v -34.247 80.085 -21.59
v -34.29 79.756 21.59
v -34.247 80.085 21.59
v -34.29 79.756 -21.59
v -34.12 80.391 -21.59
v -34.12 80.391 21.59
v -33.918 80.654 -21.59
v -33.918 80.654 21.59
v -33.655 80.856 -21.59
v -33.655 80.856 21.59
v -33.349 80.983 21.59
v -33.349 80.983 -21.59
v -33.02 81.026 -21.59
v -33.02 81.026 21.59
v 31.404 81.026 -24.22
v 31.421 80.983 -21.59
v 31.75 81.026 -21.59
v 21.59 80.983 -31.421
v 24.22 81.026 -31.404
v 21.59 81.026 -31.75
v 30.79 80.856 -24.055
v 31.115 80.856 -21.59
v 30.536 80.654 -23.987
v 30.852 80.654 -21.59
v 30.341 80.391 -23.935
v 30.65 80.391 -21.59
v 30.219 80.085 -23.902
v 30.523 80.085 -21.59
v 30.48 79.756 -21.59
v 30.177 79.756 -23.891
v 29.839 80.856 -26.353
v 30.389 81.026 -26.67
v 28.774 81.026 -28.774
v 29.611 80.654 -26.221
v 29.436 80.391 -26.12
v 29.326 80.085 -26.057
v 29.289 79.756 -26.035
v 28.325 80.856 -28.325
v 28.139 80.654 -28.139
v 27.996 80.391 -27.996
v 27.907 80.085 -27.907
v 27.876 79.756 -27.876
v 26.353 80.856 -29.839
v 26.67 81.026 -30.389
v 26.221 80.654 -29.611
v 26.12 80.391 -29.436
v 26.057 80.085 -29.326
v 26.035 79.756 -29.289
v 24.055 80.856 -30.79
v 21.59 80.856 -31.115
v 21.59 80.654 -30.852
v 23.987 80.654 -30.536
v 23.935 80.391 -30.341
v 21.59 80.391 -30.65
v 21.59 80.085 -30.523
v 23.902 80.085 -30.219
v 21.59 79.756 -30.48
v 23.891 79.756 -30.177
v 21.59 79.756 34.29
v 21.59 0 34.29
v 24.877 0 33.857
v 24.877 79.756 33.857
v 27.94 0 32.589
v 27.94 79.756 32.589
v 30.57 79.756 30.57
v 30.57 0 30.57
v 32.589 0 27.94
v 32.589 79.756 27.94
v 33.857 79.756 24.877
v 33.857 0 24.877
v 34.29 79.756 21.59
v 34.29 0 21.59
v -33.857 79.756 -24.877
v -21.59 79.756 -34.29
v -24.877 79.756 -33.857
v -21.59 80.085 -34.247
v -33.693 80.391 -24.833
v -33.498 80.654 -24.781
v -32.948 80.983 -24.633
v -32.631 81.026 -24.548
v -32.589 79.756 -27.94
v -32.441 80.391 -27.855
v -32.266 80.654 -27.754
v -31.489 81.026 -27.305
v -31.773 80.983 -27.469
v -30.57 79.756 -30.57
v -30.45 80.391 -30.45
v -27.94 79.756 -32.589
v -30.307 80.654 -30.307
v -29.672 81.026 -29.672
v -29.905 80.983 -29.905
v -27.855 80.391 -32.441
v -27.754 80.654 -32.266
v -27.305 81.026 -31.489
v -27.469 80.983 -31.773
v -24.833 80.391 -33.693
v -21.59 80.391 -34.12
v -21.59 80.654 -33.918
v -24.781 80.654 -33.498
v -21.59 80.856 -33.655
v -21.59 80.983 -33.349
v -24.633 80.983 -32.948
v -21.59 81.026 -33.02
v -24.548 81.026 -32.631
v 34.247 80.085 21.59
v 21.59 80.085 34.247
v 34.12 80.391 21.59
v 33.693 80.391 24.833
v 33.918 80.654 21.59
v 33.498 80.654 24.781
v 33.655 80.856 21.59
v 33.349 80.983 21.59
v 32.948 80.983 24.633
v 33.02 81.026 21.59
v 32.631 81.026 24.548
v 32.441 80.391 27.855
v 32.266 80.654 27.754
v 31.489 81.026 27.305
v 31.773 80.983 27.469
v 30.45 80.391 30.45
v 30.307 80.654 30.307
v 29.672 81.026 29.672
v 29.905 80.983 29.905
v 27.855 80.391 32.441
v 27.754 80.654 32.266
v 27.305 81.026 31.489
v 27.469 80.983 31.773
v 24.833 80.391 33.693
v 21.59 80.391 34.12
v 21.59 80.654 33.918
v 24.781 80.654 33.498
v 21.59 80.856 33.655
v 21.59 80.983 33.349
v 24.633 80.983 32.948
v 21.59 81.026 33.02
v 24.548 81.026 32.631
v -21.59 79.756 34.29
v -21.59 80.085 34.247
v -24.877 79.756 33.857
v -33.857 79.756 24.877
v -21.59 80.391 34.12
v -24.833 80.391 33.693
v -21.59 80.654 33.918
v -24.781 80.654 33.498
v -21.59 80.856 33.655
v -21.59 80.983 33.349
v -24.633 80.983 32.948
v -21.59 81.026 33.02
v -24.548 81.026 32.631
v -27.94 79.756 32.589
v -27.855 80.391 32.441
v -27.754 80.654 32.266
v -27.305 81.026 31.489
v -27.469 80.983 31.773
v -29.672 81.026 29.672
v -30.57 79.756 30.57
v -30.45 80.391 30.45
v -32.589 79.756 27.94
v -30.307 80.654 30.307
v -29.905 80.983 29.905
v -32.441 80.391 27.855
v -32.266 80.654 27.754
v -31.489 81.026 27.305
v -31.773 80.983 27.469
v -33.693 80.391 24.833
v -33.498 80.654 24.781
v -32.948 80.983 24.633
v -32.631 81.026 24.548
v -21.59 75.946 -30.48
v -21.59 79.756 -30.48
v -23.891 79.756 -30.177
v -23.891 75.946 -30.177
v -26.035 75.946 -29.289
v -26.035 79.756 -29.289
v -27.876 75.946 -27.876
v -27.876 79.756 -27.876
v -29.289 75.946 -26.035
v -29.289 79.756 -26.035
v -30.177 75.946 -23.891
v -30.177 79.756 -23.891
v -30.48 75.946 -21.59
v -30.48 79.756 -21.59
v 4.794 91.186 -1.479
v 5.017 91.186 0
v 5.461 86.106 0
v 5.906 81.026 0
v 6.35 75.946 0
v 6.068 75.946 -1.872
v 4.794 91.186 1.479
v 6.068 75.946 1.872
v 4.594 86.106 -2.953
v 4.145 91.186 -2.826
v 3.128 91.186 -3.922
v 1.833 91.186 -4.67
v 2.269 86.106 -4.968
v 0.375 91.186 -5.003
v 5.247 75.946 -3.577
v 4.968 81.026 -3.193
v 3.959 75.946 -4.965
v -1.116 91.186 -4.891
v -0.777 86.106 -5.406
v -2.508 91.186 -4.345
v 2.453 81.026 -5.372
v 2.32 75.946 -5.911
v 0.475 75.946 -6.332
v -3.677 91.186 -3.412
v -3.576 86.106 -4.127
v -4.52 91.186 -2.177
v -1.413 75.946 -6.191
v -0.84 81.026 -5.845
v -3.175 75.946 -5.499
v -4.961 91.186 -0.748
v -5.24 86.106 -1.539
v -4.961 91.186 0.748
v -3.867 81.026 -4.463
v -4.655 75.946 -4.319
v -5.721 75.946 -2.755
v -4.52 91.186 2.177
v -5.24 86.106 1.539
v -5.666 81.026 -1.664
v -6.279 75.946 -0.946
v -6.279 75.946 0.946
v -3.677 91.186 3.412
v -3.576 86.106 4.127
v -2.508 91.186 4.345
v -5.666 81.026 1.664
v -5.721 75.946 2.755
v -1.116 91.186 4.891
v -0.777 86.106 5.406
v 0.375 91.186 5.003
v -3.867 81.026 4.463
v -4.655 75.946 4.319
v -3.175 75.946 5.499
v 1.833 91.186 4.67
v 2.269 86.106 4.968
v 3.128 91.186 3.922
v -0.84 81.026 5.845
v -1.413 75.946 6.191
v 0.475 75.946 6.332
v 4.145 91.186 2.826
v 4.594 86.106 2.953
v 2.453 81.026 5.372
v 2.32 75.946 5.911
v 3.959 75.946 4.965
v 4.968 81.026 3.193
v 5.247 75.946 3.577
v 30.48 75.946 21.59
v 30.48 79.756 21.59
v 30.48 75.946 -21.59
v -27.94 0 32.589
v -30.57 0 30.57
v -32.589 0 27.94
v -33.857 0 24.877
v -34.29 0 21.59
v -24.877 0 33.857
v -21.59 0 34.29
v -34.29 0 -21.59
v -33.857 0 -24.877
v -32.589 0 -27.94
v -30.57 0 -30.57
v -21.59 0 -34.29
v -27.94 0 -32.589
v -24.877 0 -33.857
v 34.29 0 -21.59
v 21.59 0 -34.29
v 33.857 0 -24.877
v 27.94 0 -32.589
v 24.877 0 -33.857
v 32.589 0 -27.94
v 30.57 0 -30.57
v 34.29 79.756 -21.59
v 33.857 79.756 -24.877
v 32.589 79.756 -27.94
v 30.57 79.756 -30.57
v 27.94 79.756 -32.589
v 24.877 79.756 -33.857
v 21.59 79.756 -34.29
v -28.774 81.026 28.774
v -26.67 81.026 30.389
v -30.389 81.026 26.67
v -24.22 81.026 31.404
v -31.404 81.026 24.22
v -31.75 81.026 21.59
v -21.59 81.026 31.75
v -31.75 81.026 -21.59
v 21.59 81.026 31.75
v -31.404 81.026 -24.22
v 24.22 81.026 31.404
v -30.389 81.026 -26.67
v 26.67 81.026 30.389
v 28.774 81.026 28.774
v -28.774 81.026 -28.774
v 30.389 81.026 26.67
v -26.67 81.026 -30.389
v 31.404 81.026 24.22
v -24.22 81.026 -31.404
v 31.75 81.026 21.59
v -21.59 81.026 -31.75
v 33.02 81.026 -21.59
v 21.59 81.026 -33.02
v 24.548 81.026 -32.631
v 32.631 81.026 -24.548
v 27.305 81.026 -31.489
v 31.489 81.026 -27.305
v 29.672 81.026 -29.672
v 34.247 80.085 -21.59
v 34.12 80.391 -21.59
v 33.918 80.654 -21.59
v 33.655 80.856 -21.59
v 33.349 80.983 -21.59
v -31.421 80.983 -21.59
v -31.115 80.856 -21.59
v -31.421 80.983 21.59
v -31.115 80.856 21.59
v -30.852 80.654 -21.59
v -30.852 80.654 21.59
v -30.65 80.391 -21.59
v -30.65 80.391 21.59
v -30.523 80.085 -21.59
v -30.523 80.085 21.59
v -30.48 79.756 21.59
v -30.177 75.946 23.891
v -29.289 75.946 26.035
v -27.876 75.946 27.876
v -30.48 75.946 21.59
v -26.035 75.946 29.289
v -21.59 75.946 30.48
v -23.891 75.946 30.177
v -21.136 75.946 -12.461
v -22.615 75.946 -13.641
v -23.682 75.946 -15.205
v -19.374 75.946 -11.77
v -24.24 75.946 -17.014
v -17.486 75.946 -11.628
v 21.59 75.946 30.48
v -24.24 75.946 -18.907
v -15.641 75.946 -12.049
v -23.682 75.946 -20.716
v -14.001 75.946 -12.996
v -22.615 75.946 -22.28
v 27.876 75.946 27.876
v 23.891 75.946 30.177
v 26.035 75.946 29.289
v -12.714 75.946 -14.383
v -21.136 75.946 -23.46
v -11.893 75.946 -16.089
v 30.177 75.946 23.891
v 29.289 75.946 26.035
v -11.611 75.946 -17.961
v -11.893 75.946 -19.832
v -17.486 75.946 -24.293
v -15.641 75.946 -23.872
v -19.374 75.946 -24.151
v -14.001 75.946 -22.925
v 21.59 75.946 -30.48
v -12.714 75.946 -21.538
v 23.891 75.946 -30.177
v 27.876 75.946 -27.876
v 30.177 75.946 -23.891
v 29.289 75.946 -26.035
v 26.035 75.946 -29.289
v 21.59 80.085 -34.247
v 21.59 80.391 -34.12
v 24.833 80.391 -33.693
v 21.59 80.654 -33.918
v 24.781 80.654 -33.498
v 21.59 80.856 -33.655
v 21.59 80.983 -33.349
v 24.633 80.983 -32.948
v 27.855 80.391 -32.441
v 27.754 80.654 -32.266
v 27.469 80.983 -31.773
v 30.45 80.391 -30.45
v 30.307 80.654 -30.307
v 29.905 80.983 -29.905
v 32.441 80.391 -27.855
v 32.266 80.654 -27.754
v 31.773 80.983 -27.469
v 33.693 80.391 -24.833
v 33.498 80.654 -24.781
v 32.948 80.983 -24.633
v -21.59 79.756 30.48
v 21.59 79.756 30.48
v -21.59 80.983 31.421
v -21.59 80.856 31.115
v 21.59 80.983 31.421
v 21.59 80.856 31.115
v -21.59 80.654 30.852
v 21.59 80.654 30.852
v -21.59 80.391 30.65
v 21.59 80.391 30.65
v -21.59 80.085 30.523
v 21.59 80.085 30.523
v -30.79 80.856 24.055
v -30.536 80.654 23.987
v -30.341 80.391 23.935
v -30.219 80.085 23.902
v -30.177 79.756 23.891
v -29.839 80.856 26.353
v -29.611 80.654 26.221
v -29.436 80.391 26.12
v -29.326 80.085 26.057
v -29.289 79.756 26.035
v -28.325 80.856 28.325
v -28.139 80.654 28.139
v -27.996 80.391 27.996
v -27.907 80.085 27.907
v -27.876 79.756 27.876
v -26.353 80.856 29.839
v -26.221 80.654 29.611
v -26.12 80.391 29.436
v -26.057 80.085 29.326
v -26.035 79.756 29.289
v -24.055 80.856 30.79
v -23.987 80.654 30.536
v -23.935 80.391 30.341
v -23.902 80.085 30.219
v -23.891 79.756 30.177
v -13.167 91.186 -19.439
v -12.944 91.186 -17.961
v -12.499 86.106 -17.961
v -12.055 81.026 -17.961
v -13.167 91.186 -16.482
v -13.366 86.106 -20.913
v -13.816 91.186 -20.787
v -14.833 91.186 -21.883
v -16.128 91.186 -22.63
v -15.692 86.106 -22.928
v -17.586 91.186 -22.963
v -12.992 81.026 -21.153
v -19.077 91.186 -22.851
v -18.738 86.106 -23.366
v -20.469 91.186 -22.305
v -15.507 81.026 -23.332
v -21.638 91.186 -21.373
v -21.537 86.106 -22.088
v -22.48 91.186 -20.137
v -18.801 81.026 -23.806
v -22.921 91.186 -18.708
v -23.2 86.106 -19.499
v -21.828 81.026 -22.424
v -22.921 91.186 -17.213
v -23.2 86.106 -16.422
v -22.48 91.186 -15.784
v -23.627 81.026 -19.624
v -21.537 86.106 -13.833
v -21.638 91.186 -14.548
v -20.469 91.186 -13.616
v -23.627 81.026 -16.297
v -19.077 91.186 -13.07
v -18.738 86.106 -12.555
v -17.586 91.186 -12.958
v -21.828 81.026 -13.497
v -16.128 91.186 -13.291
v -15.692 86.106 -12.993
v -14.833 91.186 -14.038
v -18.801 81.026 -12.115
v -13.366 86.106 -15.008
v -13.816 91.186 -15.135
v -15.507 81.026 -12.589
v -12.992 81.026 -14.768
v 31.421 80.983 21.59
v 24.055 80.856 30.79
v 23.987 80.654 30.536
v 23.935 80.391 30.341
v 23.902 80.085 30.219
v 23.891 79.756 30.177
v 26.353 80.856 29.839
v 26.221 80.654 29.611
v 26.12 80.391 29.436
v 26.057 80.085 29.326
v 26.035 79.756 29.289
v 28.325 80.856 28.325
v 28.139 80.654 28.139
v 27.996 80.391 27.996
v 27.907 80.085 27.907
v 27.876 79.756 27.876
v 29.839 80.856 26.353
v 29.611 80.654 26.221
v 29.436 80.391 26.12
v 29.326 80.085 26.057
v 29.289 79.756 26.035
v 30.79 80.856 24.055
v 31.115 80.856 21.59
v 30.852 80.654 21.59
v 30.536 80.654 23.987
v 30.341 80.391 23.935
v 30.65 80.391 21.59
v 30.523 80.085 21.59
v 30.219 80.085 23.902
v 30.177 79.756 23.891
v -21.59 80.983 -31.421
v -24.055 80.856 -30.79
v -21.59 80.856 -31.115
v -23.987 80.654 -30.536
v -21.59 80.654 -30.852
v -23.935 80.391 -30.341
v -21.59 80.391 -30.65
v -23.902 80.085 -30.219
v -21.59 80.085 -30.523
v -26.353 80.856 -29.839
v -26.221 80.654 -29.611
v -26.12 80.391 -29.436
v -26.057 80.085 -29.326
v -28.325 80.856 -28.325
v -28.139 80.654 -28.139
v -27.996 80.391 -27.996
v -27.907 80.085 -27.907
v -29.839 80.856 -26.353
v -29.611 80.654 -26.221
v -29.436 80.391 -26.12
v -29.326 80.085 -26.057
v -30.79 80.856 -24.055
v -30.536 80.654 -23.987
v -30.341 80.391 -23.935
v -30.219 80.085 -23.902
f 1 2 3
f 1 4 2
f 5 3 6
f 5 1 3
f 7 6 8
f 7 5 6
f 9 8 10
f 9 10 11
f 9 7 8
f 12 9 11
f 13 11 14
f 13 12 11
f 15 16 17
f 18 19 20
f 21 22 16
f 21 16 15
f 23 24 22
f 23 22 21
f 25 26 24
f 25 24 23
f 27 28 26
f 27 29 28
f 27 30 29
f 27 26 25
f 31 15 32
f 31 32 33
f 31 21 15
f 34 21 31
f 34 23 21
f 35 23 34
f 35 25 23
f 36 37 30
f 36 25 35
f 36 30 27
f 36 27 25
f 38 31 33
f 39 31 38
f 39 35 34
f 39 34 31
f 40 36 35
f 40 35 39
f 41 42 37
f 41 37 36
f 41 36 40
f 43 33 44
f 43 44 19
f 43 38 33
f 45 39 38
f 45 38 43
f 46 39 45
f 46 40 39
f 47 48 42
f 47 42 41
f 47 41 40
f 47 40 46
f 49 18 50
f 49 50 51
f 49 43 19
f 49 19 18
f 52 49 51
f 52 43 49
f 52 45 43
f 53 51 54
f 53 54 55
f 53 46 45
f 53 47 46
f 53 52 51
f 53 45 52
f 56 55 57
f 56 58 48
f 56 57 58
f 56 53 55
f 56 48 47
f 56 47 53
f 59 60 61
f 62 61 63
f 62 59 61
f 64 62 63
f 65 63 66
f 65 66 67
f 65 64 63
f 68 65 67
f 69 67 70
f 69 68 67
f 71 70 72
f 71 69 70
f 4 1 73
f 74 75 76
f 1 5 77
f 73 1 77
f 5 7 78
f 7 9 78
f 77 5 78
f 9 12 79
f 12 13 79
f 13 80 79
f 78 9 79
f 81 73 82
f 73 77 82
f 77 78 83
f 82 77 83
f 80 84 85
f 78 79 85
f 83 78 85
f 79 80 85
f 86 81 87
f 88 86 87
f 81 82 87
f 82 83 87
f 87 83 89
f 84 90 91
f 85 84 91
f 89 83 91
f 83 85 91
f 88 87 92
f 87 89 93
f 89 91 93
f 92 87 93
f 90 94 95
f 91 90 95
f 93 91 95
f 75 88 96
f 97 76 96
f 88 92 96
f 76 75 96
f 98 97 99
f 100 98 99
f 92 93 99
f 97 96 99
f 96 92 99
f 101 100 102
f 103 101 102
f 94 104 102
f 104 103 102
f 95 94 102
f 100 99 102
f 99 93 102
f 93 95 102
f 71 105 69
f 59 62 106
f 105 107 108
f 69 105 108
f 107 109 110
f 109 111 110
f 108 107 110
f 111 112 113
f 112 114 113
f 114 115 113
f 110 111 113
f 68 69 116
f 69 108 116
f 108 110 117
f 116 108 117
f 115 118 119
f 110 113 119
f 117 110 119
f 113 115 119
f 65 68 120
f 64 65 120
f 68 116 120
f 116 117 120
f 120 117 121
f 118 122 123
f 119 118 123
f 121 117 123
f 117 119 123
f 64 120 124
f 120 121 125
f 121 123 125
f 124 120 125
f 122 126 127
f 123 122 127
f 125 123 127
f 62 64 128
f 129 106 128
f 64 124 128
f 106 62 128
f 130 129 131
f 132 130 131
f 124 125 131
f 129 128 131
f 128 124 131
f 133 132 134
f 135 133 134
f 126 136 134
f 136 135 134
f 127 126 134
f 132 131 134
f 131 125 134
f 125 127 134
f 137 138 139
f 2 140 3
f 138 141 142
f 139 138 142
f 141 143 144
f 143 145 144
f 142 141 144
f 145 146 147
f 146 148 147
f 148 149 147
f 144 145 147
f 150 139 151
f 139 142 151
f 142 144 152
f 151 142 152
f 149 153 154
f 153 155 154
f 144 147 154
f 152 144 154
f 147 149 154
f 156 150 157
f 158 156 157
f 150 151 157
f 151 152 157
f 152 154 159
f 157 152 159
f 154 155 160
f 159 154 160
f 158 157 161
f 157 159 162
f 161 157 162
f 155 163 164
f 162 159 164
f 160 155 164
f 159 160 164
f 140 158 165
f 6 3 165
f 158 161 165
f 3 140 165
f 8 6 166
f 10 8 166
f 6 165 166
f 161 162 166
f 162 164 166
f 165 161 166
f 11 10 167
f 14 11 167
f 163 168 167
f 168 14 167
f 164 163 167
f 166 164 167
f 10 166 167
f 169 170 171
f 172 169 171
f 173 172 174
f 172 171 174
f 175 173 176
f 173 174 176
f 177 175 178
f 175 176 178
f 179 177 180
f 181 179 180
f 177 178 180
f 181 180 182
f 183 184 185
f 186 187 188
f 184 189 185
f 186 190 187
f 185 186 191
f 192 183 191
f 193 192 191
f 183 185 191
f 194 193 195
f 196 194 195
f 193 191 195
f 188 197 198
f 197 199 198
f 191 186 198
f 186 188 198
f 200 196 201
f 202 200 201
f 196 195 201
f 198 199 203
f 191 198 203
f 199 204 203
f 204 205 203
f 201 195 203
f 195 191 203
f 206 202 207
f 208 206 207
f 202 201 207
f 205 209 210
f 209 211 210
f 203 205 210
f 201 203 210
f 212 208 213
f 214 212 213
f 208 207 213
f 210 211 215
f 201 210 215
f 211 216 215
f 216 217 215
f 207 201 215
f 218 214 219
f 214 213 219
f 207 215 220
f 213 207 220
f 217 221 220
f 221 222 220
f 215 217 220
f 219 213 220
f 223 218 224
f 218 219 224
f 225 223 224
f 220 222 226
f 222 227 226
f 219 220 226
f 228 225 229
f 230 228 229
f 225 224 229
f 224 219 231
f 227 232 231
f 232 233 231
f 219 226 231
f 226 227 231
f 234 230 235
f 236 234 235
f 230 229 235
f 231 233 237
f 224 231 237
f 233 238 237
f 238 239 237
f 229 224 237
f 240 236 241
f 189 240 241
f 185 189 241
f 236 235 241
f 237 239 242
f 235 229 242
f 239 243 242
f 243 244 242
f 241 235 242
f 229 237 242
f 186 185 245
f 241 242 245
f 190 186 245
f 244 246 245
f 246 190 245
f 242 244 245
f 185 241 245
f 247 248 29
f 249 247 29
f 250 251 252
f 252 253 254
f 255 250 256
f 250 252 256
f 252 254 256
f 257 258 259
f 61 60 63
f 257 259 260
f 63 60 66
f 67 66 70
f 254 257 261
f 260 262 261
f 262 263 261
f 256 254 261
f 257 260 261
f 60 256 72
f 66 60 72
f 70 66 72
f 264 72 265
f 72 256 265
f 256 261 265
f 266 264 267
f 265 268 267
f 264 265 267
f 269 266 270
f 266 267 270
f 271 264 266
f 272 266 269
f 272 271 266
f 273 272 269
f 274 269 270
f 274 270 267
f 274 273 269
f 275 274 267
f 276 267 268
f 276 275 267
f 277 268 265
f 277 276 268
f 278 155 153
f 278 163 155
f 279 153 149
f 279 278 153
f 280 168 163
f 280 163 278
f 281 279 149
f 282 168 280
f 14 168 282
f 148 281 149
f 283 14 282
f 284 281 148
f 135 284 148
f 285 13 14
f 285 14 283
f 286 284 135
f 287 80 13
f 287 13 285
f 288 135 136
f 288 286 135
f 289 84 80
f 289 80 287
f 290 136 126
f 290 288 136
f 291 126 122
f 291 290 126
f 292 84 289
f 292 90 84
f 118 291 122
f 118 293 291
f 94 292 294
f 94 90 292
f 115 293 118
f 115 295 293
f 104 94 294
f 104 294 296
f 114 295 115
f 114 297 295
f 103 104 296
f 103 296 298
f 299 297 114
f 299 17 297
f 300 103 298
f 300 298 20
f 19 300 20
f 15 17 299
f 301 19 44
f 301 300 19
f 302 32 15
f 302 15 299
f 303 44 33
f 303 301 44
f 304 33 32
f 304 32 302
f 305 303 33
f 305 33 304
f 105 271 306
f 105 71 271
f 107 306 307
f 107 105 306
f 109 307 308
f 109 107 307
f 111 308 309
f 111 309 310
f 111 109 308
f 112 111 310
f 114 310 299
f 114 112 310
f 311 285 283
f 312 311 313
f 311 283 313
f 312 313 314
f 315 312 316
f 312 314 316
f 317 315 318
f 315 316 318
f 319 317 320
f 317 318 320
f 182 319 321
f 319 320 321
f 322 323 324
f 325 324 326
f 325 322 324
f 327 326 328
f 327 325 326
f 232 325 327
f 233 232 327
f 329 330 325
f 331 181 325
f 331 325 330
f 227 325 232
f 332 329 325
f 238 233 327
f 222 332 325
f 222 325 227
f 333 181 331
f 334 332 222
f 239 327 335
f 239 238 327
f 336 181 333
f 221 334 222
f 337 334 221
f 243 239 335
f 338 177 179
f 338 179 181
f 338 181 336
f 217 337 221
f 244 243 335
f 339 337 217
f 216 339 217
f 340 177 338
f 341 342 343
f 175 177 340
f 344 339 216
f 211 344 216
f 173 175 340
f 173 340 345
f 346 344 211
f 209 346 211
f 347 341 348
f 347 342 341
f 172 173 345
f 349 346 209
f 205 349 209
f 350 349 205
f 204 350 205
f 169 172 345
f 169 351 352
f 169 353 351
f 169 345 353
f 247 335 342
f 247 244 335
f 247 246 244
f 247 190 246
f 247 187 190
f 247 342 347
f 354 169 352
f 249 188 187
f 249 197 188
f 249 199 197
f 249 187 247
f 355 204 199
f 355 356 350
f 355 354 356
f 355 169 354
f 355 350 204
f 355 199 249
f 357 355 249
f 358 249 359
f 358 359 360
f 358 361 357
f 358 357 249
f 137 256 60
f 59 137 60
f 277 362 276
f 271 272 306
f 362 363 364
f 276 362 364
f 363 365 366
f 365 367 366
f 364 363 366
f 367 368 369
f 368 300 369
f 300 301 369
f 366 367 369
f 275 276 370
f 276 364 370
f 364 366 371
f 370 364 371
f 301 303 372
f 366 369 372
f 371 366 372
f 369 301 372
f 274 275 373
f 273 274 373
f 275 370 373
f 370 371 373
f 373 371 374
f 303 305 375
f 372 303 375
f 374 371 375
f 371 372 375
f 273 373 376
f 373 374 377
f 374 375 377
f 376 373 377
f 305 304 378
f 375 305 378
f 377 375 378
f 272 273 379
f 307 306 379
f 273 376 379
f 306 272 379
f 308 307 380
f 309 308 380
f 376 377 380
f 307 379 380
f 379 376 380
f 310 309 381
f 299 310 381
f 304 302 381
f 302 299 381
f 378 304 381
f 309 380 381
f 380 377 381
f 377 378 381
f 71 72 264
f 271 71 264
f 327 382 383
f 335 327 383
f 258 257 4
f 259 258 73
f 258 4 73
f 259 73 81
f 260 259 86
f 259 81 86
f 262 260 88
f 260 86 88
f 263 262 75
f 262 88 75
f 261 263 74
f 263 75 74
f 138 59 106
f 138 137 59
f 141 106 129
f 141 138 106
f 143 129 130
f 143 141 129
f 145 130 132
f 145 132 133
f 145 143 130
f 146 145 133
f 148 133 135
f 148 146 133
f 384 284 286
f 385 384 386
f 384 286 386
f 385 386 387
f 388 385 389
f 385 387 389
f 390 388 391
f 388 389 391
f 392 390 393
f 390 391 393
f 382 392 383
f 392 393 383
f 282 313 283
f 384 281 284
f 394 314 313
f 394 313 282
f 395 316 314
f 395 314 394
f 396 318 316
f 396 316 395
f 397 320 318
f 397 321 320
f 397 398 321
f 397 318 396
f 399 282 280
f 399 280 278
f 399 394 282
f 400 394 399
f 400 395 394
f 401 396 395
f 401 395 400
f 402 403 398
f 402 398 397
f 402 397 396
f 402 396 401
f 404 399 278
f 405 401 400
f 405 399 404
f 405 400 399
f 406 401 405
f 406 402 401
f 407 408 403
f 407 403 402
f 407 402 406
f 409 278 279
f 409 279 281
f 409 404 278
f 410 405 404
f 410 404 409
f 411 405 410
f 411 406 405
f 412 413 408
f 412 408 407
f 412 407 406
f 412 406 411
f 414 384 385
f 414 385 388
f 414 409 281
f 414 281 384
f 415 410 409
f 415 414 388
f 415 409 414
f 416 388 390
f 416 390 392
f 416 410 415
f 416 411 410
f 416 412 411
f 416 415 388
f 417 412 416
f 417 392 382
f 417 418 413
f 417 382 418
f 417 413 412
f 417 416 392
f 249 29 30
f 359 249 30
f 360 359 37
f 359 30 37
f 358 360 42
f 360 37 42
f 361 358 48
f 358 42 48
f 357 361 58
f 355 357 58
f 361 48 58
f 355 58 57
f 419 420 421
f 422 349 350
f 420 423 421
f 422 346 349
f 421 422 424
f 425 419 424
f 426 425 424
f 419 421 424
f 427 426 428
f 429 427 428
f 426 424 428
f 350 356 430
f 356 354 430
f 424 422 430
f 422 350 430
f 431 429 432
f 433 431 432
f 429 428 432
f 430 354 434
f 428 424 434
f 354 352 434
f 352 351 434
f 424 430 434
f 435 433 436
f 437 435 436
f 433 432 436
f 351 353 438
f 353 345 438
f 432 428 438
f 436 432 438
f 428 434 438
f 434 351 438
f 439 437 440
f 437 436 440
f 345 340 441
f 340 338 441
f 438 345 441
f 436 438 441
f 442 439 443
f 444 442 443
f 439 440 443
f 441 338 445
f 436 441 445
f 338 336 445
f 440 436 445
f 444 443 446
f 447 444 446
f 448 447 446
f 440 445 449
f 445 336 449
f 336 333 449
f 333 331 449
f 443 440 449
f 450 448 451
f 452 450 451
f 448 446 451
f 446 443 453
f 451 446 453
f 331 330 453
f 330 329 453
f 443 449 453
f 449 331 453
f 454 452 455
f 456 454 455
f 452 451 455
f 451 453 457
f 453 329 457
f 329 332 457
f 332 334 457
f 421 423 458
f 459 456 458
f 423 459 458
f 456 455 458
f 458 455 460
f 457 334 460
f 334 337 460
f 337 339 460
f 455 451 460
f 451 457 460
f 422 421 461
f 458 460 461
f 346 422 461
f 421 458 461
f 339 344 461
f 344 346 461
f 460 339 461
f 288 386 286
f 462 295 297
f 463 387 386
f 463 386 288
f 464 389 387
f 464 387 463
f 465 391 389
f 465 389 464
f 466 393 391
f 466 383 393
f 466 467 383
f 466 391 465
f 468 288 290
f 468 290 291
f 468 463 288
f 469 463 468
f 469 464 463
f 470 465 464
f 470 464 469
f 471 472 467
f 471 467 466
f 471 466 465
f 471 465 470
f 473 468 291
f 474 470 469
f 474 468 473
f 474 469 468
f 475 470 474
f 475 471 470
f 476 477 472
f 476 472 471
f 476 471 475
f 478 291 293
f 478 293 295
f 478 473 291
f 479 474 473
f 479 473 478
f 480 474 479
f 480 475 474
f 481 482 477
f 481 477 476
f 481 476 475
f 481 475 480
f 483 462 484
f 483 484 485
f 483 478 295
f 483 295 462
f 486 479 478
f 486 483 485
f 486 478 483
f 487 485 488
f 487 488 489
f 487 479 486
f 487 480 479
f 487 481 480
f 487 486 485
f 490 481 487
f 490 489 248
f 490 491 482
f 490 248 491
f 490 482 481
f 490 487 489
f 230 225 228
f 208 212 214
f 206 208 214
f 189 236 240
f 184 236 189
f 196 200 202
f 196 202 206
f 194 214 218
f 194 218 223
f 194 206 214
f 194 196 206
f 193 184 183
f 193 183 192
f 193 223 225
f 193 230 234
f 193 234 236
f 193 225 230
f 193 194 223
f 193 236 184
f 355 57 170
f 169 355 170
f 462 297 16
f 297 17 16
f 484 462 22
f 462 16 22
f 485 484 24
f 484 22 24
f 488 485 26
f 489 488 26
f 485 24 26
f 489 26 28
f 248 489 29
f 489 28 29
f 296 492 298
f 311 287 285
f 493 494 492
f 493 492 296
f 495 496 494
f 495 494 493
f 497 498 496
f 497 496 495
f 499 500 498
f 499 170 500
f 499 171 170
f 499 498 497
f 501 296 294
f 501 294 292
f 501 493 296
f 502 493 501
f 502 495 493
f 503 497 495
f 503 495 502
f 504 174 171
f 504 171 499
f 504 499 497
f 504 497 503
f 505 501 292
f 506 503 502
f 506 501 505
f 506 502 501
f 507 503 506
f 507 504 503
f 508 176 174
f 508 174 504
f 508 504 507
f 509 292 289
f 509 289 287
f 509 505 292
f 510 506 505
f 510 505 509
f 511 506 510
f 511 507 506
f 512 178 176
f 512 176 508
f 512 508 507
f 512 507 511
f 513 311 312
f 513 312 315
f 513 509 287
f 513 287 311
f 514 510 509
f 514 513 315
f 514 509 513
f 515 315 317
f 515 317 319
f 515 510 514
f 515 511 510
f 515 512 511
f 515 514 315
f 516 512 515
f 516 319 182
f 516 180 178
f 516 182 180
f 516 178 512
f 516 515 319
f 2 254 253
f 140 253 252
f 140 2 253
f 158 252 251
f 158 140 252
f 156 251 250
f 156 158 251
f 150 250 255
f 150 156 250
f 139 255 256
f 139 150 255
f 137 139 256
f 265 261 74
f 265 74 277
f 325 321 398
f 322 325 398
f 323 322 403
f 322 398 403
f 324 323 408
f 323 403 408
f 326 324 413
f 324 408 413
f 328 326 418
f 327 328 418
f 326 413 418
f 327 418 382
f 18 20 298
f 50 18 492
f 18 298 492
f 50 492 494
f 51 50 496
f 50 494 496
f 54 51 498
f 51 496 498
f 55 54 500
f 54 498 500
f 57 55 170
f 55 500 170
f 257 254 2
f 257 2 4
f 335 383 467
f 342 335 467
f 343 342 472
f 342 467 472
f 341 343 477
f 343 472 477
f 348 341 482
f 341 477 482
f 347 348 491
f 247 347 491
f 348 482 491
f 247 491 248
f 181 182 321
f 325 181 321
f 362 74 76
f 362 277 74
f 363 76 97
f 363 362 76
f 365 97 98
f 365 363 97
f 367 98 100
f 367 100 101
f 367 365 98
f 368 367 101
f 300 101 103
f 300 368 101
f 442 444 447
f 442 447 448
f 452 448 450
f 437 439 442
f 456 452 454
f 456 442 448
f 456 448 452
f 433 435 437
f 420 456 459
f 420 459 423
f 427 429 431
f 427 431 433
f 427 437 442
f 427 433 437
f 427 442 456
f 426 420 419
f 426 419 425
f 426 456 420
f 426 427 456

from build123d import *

# Parameters (mm, degrees)
SKETCH1_W                 = 68.58
SKETCH1_H                 = 68.58
BASE_EXTRUDE_DEPTH        = 81.026
SIDE_FILLETS_R            = 12.7
TOP_CUT_DEPTH             = 5.08
TOP_FACE_FILLET_R         = 1.27
SKETCH4_R                 = 6.35
TERMINALS_DEPTH           = 15.24
TERMINALS_DRAFT           = 5
TERMINALS_PROFILE_2_DEPTH = 15.24
TERMINALS_PROFILE_2_DRAFT = 5


with BuildPart() as part:
    # Sketch1 → Base Extrude (new body)
    with BuildSketch(Plane(origin=(0, 0, 0), x_dir=(1, 0, 0), z_dir=(0, 1, 0))):
        Rectangle(SKETCH1_W, SKETCH1_H)
    extrude(amount=BASE_EXTRUDE_DEPTH)

    # Side Fillets
    side_fillets_edges = [part.edges().sort_by_distance(p)[0] for p in [
        (34.29, 40.513, 34.29),
        (-34.29, 40.513, 34.29),
        (-34.29, 40.513, -34.29),
        (34.29, 40.513, -34.29),
    ]]
    fillet(side_fillets_edges, radius=SIDE_FILLETS_R)

    # Sketch3 → Top Cut (cut)
    with BuildSketch(Plane(origin=(0, 81.026, 0), x_dir=(1, 0, 0), z_dir=(0, 1, 0))):
        with BuildLine():
            Line((21.59, 30.48), (-21.59, 30.48))
            ThreePointArc((-21.59, 30.48), (-27.876179285, 27.876179285), (-30.48, 21.59))
            Line((-30.48, 21.59), (-30.48, -21.59))
            ThreePointArc((-30.48, -21.59), (-27.876179285, -27.876179285), (-21.59, -30.48))
            Line((-21.59, -30.48), (21.59, -30.48))
            ThreePointArc((21.59, -30.48), (27.876179285, -27.876179285), (30.48, -21.59))
            Line((30.48, -21.59), (30.48, 21.59))
            ThreePointArc((30.48, 21.59), (27.876179285, 27.876179285), (21.59, 30.48))
        make_face()
    extrude(amount=-TOP_CUT_DEPTH, mode=Mode.SUBTRACT)

    # Top Face Fillet
    top_face_fillet_edges = [part.edges().sort_by_distance(p)[0] for p in [
        (-34.29, 81.026, 0),
        (0, 81.026, -34.29),
        (34.29, 81.026, 0),
        (0, 81.026, 34.29),
        (-30.570256121, 81.026, 30.570256121),
        (30.570256121, 81.026, 30.570256121),
        (30.570256121, 81.026, -30.570256121),
        (-30.570256121, 81.026, -30.570256121),
        (27.876179285, 81.026, -27.876179285),
        (0, 81.026, -30.48),
        (-27.876179285, 81.026, -27.876179285),
        (-30.48, 81.026, 0),
        (-27.876179285, 81.026, 27.876179285),
        (0, 81.026, 30.48),
        (27.876179285, 81.026, 27.876179285),
        (30.48, 81.026, 0),
    ]]
    fillet(top_face_fillet_edges, radius=TOP_FACE_FILLET_R)


with BuildPart() as terminals_tool:
    # Sketch4 → Terminals (with draft: the straight prism first)
    with BuildSketch(Plane(origin=(0, 75.946, 0), x_dir=(1, 0, 0), z_dir=(0, 1, 0))):
        Circle(SKETCH4_R)
    extrude(amount=TERMINALS_DEPTH)
    # Terminals: the draft: its side faces are tilted about the plane it starts from
    terminals_sides = [terminals_tool.faces().sort_by_distance(p)[0] for p in [
        (-6.35, 83.566, 0),
    ]]
    draft(terminals_sides, Plane(origin=(0, 75.946, 0), x_dir=(1, 0, 0), z_dir=(0, 1, 0)), TERMINALS_DRAFT)


with BuildPart() as part_1:
    add(part.part)

    # Terminals: add terminals_tool
    add(terminals_tool.part)


with BuildPart() as terminals_profile_2_tool:
    # Sketch4 → Terminals profile 2 (with draft: the straight prism first)
    with BuildSketch(Plane(origin=(0, 75.946, 0), x_dir=(1, 0, 0), z_dir=(0, 1, 0))):
        with Locations((-17.960512242, 17.960512242)):
            Circle(SKETCH4_R)
    extrude(amount=TERMINALS_PROFILE_2_DEPTH)
    # Terminals profile 2: the draft: its side faces are tilted about the plane it starts from
    terminals_profile_2_sides = [terminals_profile_2_tool.faces().sort_by_distance(p)[0] for p in [
        (-24.310512242, 83.566, -17.960512242),
    ]]
    draft(terminals_profile_2_sides, Plane(origin=(0, 75.946, 0), x_dir=(1, 0, 0), z_dir=(0, 1, 0)), TERMINALS_PROFILE_2_DRAFT)


with BuildPart() as part_2:
    add(part_1.part)

    # Terminals profile 2: add terminals_profile_2_tool
    add(terminals_profile_2_tool.part)


solid = part_2.part
